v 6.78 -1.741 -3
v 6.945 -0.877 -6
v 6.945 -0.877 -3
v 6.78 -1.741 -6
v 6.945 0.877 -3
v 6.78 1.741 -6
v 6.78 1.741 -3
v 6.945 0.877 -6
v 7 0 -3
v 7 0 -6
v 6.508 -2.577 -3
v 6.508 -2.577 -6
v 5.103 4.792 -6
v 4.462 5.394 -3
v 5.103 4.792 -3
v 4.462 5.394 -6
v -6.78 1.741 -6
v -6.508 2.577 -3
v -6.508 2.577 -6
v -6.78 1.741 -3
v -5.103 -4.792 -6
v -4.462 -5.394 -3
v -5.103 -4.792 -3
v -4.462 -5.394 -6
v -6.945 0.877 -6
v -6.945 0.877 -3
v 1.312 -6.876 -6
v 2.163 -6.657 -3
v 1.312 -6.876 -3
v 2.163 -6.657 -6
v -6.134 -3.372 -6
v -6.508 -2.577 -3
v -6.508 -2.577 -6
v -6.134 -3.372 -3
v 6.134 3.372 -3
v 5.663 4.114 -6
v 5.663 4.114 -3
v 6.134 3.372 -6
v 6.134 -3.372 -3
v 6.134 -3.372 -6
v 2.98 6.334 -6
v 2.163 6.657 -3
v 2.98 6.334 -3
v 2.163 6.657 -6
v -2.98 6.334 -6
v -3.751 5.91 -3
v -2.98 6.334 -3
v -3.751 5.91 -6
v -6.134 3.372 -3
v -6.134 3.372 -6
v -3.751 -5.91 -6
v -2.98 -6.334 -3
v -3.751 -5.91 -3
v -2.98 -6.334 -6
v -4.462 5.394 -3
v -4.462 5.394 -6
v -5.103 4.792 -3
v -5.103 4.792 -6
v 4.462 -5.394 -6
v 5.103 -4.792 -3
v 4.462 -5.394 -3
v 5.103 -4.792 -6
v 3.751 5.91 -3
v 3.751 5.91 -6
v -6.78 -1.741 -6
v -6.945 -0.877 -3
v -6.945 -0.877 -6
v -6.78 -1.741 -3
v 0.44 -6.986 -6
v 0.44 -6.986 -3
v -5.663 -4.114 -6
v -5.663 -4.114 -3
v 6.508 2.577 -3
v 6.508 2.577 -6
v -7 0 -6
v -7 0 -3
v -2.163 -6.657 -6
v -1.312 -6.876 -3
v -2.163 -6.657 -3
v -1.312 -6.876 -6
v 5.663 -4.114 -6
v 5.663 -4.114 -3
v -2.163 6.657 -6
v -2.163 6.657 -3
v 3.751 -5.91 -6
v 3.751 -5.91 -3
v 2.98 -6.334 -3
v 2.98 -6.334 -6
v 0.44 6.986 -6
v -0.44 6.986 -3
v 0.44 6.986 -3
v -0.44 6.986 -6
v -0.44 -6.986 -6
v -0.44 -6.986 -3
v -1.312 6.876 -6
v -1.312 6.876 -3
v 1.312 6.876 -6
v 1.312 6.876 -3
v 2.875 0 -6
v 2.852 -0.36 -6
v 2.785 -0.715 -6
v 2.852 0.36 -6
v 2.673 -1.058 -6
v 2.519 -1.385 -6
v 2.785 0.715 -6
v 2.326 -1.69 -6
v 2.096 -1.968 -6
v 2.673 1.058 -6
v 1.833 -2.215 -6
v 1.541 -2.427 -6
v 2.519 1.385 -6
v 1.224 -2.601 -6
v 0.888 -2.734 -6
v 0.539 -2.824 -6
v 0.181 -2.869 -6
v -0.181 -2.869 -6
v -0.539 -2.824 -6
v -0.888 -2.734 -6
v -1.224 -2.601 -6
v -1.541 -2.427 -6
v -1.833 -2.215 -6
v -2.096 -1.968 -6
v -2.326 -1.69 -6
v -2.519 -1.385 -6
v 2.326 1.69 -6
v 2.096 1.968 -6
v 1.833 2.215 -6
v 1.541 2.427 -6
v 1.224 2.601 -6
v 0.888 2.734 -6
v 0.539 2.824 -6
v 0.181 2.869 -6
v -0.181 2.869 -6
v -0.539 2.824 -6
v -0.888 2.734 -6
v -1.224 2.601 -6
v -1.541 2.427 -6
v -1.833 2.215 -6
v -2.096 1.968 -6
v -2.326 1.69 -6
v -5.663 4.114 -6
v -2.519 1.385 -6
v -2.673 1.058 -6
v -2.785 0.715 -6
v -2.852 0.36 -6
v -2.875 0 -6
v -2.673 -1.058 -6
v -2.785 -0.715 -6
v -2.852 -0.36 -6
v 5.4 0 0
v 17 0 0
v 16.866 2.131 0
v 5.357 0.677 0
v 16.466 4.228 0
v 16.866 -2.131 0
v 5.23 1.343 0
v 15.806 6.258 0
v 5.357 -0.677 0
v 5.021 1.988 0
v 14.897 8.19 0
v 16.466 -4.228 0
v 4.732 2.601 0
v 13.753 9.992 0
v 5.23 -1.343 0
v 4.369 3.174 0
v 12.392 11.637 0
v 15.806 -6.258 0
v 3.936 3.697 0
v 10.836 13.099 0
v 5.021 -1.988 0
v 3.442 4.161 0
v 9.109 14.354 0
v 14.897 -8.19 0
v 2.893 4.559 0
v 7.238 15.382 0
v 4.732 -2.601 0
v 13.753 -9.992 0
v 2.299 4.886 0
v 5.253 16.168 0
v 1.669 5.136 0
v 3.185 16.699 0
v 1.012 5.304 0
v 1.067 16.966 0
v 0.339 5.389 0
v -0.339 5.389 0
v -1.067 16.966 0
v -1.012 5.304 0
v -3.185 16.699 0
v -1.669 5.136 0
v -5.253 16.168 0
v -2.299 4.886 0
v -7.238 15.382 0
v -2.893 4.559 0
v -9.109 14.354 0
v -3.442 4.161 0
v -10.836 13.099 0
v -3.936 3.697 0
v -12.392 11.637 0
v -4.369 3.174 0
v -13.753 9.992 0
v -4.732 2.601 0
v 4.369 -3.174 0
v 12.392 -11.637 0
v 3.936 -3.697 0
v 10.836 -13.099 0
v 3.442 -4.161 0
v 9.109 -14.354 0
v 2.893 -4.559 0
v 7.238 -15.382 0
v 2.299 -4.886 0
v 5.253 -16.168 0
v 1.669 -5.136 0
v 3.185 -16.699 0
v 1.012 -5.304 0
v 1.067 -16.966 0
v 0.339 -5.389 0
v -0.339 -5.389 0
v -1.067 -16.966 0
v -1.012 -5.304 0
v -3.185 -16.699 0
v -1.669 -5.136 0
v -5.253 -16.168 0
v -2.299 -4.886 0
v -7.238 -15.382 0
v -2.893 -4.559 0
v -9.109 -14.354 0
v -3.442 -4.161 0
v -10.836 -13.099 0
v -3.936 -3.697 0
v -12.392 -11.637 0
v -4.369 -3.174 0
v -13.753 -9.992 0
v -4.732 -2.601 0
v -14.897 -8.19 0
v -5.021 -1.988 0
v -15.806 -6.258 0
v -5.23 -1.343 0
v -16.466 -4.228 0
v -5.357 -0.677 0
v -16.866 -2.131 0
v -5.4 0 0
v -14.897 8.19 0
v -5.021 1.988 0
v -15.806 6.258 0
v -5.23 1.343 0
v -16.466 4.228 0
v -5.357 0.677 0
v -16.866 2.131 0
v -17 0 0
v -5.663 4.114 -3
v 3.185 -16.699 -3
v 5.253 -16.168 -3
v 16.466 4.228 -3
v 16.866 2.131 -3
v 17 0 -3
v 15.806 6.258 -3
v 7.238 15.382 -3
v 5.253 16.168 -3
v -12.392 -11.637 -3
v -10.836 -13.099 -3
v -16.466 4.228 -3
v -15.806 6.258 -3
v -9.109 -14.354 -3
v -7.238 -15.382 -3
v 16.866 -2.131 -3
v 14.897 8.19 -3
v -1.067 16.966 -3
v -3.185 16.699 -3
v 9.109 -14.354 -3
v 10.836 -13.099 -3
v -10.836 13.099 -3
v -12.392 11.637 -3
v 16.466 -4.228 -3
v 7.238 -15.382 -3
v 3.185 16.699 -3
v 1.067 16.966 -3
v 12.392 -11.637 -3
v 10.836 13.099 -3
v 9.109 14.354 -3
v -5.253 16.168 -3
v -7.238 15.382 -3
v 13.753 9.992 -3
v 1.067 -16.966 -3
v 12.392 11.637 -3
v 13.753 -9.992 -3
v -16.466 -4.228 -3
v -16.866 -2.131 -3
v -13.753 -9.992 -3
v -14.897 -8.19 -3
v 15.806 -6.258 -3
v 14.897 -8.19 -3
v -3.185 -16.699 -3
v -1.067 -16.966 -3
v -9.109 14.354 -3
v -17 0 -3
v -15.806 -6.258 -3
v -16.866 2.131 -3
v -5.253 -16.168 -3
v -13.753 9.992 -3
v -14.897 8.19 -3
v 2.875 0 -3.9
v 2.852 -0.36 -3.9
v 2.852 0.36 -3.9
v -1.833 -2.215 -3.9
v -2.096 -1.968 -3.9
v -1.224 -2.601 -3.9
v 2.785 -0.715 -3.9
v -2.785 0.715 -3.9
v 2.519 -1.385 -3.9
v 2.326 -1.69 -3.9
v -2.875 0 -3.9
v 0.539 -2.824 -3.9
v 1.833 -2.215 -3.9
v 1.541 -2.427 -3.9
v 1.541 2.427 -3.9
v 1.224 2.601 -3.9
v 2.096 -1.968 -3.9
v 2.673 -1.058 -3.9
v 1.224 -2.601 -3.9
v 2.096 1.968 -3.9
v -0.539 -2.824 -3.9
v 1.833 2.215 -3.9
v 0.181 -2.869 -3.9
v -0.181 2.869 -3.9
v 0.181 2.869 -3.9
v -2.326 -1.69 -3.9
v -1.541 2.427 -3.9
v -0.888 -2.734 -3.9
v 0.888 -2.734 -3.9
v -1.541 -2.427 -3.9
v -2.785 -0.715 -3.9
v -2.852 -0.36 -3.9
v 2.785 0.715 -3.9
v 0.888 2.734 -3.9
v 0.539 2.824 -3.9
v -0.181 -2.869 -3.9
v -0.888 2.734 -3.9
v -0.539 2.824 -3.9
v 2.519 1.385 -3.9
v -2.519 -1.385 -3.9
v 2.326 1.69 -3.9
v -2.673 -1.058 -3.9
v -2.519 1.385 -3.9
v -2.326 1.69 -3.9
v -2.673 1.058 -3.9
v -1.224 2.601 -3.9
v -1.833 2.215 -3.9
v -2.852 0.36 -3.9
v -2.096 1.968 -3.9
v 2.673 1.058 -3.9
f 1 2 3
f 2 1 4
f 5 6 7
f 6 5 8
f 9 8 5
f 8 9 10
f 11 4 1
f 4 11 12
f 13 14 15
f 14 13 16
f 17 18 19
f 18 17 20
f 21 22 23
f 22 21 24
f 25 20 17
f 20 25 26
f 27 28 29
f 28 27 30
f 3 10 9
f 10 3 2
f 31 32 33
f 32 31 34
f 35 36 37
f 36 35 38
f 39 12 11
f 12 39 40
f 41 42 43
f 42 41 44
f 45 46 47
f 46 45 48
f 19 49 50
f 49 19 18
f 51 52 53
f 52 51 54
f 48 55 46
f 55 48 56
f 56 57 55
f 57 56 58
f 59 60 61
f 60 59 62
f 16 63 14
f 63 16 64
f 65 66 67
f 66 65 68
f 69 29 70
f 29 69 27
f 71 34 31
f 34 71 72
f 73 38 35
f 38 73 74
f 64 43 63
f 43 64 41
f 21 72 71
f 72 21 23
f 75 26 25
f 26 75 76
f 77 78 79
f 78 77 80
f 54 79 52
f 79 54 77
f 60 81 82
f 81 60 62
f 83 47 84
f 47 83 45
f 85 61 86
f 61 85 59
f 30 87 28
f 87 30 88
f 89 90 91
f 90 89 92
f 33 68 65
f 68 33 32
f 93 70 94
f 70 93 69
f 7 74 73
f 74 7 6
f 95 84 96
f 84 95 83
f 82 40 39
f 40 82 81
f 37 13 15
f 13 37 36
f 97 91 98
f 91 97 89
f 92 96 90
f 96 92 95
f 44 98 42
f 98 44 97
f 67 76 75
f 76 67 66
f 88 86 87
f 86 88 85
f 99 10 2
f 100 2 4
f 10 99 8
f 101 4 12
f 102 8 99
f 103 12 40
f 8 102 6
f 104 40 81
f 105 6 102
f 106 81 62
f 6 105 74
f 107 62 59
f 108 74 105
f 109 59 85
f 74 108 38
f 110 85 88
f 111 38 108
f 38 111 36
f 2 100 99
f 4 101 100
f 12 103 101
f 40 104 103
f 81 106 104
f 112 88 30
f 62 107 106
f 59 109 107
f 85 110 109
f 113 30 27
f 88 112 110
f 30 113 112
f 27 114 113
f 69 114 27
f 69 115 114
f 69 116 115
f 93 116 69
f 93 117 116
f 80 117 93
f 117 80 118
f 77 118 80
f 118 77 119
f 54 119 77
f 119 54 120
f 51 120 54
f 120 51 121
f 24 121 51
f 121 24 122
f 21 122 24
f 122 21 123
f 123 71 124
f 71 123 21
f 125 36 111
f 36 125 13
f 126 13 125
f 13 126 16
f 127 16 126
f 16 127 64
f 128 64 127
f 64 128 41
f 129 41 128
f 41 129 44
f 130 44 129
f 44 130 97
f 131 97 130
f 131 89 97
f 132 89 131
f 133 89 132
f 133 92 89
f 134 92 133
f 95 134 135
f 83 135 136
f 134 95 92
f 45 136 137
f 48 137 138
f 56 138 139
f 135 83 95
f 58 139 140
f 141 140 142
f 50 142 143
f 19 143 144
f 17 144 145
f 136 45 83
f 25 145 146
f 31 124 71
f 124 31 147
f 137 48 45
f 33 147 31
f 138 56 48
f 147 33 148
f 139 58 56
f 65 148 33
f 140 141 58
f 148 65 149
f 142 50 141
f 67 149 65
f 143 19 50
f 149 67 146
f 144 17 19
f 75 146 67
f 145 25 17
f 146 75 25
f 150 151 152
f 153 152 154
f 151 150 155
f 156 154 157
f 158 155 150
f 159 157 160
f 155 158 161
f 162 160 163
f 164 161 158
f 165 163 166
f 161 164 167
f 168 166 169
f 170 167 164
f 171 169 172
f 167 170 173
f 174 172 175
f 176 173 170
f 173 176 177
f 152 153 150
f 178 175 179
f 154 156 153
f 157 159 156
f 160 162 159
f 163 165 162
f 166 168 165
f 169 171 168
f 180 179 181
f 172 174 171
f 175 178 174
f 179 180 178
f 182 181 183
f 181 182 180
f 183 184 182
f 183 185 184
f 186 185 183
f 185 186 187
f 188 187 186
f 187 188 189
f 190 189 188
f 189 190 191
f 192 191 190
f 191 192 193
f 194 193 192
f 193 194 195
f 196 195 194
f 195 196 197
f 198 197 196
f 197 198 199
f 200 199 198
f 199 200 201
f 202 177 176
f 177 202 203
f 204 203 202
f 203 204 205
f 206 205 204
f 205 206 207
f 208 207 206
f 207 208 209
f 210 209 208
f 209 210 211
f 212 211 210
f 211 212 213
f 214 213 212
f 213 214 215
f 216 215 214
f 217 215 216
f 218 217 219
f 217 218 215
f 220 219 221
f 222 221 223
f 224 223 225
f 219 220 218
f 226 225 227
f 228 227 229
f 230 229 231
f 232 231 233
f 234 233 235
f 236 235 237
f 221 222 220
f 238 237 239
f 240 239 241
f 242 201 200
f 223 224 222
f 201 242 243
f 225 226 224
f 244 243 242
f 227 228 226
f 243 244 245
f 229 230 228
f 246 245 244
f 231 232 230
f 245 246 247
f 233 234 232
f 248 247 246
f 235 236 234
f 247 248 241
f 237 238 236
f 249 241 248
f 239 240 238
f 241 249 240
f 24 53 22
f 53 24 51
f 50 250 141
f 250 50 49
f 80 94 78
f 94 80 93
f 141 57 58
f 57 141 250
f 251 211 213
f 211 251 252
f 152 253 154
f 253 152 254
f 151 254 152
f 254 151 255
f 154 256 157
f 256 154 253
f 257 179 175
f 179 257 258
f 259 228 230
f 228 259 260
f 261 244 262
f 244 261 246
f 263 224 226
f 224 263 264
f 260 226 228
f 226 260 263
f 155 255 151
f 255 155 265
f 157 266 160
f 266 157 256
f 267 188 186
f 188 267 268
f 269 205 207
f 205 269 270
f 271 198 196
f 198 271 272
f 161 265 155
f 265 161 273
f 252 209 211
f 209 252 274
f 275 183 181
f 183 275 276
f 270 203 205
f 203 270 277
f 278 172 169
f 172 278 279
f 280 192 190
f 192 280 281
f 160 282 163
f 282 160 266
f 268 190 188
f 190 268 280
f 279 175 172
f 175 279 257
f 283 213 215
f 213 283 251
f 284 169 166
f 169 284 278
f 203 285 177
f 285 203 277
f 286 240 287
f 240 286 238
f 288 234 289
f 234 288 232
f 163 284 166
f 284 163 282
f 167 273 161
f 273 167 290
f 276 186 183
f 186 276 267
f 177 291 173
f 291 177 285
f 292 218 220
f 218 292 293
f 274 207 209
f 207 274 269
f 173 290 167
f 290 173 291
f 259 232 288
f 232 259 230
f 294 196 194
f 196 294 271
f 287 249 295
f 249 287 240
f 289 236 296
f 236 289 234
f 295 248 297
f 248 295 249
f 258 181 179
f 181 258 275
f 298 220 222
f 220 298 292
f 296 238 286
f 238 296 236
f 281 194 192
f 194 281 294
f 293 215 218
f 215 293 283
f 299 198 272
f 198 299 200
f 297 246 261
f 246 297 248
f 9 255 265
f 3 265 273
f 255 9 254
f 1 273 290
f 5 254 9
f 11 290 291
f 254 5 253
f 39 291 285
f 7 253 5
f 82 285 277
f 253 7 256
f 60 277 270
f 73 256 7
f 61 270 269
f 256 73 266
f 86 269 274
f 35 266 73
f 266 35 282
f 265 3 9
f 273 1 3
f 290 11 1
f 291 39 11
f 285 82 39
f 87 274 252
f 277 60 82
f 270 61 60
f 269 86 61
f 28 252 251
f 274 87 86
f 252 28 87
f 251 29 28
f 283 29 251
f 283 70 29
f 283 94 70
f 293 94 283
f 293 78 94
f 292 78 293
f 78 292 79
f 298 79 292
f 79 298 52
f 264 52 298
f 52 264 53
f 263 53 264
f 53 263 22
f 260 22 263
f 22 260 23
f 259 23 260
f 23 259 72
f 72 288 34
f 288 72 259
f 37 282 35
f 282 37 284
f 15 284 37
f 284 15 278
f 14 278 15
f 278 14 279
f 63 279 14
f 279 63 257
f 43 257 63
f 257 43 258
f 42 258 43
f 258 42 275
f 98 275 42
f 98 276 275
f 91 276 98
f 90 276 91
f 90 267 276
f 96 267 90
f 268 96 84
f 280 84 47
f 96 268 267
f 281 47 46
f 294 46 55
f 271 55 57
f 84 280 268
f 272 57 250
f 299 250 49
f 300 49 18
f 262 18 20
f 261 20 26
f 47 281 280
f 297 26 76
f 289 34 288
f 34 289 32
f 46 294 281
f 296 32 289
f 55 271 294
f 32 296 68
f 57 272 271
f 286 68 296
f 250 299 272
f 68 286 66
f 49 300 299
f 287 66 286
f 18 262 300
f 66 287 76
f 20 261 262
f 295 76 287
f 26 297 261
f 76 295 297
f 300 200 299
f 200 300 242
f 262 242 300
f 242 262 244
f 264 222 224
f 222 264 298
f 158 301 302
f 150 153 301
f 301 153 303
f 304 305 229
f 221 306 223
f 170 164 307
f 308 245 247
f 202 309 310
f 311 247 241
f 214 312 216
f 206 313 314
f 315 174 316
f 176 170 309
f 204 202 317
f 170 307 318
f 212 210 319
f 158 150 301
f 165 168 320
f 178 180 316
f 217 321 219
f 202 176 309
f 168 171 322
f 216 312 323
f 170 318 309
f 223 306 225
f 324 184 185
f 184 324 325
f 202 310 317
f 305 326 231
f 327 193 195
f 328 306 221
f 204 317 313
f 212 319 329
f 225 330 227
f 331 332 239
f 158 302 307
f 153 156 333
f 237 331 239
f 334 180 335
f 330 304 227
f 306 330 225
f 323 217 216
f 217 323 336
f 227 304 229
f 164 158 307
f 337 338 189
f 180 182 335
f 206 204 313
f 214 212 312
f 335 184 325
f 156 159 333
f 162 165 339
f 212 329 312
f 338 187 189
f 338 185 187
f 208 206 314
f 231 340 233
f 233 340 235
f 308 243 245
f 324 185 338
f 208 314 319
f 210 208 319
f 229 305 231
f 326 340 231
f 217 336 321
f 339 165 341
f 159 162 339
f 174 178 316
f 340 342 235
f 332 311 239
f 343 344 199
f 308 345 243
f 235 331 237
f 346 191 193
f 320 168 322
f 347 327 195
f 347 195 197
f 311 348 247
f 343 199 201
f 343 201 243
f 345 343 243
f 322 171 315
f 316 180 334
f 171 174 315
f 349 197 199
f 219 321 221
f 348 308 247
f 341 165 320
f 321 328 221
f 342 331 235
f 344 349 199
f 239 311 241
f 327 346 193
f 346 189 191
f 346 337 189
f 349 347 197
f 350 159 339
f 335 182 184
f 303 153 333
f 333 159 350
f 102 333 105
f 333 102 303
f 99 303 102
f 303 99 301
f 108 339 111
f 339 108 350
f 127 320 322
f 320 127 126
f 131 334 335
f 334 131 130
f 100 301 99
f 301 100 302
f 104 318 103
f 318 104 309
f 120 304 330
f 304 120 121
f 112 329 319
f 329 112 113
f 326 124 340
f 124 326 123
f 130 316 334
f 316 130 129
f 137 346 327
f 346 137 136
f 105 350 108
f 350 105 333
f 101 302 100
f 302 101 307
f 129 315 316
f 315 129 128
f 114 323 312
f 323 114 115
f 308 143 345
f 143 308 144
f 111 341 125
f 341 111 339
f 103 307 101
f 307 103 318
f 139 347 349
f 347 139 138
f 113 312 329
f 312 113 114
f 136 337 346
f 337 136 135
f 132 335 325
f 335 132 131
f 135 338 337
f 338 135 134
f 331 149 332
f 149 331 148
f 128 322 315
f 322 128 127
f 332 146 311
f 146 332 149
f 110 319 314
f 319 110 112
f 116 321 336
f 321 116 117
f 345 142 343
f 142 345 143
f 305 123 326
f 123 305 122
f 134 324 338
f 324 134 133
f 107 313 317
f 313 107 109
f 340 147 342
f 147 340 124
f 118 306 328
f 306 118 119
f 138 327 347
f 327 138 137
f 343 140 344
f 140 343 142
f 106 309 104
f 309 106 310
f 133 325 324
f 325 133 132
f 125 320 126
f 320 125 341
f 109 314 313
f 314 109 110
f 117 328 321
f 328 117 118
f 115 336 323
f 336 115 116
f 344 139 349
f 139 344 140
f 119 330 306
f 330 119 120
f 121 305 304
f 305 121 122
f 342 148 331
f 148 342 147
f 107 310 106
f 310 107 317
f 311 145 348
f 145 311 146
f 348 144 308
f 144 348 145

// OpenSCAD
$fn = 50;


difference() {
	union() {
		translate(v = [0, 0, -6.0000000000]) {
			cylinder(h = 6, r = 7.0000000000);
		}
		translate(v = [0, 0, -3.0000000000]) {
			cylinder(h = 3, r = 17.0000000000);
		}
	}
	union() {
		translate(v = [0, 0, 0]) {
			rotate(a = [0, 0, 0]) {
				difference() {
					union() {
						#translate(v = [0, 0, -6.0000000000]) {
							cylinder(h = 6, r = 2.6000000000);
						}
						#translate(v = [0, 0, -3.9000000000]) {
							cylinder(h = 3.9000000000, r = 7.0000000000, r1 = 2.8750000000, r2 = 5.4000000000);
						}
						#translate(v = [0, 0, -6.0000000000]) {
							cylinder(h = 6, r = 2.8750000000);
						}
						#translate(v = [0, 0, -6.0000000000]) {
							cylinder(h = 6, r = 2.6000000000);
						}
					}
					union();
				}
			}
		}
	}
}
